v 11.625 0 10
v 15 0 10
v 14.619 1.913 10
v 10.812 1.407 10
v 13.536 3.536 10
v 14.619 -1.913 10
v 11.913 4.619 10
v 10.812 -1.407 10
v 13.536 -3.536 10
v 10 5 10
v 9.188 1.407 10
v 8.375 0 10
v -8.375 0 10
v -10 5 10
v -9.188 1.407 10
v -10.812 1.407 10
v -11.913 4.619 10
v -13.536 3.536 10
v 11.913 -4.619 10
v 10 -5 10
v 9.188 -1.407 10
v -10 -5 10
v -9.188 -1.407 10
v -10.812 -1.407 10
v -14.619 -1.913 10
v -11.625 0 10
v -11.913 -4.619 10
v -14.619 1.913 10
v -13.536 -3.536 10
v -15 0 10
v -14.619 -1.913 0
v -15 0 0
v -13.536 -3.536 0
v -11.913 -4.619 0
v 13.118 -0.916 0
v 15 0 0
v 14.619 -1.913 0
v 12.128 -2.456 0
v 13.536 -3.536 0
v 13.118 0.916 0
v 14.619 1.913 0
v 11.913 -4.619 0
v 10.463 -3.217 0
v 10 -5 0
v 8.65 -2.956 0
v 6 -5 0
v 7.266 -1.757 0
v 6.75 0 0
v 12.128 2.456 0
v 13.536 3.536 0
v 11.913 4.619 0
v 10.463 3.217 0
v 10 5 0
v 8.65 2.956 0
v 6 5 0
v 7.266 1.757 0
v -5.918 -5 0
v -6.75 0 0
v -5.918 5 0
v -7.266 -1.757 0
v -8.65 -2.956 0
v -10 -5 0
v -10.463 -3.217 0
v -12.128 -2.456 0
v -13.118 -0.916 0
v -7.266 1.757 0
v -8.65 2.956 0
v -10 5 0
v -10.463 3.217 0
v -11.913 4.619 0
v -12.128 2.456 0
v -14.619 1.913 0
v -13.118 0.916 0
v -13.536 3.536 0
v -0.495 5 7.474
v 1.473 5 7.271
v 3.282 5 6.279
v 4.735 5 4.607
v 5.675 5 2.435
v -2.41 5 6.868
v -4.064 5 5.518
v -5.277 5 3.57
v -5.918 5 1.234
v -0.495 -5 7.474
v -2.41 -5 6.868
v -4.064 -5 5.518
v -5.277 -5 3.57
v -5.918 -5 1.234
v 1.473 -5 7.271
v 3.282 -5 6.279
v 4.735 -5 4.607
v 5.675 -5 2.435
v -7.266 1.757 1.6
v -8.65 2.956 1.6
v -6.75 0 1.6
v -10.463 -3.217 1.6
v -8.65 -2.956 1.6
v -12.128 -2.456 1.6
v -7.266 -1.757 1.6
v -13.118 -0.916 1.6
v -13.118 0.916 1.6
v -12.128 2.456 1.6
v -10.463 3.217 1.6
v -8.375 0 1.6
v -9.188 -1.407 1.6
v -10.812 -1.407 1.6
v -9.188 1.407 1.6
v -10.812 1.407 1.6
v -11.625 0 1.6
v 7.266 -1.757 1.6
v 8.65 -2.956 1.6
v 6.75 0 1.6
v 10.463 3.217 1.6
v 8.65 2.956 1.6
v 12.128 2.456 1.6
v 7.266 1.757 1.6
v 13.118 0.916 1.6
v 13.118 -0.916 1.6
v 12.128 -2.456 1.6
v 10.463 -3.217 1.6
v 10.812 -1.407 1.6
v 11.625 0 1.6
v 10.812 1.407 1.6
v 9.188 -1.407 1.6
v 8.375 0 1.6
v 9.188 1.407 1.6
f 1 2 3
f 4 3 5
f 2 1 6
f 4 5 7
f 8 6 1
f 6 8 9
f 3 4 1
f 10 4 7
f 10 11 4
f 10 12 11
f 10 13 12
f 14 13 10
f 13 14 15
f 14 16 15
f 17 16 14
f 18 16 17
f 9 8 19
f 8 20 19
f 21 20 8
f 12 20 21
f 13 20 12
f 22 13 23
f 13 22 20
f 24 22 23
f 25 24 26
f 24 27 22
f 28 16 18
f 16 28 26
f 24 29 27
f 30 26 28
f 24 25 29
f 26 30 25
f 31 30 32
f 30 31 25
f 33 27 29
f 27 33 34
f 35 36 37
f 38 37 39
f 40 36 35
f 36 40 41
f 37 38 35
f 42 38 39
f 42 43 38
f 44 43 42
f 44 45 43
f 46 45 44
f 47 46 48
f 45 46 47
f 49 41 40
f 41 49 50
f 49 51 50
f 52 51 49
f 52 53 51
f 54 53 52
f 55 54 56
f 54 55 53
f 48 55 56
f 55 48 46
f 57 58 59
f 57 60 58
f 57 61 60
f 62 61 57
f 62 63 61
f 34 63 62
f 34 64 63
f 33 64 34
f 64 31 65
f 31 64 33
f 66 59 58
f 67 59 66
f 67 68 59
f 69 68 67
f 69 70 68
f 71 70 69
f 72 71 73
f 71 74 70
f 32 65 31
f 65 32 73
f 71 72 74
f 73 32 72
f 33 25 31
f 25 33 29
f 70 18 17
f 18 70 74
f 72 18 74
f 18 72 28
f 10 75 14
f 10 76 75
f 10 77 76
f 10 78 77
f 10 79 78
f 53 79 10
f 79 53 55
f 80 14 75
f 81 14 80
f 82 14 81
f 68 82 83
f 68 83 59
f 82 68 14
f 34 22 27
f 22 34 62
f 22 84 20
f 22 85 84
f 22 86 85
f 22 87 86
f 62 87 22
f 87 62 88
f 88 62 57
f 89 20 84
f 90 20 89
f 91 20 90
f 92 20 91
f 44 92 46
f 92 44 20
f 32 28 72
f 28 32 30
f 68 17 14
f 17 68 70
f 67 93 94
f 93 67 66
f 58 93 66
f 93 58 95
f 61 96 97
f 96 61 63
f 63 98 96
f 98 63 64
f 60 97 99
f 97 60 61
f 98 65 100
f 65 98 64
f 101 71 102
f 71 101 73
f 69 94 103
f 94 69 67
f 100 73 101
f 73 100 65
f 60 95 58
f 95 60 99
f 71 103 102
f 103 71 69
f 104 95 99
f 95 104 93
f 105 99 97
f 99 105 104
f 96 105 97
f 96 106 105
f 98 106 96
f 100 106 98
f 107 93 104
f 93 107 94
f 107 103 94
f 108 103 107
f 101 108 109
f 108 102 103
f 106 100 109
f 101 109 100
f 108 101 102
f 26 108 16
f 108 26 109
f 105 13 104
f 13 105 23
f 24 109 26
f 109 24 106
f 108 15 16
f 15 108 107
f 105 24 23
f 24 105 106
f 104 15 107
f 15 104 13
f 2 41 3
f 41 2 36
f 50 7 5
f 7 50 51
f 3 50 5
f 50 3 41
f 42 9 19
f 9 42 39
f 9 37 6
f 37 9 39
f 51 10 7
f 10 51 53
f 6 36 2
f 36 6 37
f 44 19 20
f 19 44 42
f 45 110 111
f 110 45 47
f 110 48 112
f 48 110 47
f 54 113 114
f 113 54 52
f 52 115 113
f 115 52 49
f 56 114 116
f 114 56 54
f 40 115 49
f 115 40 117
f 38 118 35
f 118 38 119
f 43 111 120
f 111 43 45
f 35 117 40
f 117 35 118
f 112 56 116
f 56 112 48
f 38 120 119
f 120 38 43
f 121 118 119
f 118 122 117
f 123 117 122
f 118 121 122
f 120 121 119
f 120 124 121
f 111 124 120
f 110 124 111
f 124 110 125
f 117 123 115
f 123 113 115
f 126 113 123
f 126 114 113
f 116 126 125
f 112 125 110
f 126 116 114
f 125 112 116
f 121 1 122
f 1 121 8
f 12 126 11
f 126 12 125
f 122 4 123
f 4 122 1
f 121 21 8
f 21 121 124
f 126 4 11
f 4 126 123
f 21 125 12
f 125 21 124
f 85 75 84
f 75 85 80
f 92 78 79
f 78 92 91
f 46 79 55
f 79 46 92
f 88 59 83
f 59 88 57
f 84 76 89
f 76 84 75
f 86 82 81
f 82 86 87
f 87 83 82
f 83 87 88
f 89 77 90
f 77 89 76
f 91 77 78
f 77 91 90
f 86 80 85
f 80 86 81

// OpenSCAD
// file: ../baseplate/nuts.scad
module rrect(w,l,r) {
    translate([r,r,0]) {
        minkowski() {
            square(size = [w-(2*r), l-(2*r)]);
            circle(r=r);
        }
    }
}

module nuthole_m2() {
    circle(d=2.1);
}

module nuthole_m25() {
    circle(d=2.6);
}

module nuthole_m3() {
    circle(d=3.15);
}
// main file
f = 10;
dist = 20;
height = 10;
screwhole=3.25;
tunnel_w = 12;
tunnel_h = 7.5;

use <../baseplate/nuts.scad>

module cable_holder_holes() {
    translate([-dist/2, 0, 0]) nuthole_m3();
    translate([dist/2, 0, 0]) nuthole_m3();
}

module cable_holder_column() {
    difference() {
        linear_extrude(height) union() {
            circle(d=f);
            translate([0, -f/2, 0]) square([f/2, f]);
        }
            
        translate([0, 0, -0.1]) linear_extrude(1.7) circle(d=6.5);
        translate([0, 0, -0.1]) linear_extrude(height + 0.2) circle(d=screwhole);
    }
}

module cable_holder() {
    difference() {
        union() {
            translate([-dist/2, 0, 0]) cable_holder_column();
            translate([dist/2, 0, 0]) rotate([0, 0, 180]) cable_holder_column();
            linear_extrude(height) square([dist - f + 0.01, f], center = true);
        }
       
        scale([1, 1, tunnel_h / (tunnel_w * 0.5)])
        translate([0, f, 0]) rotate([90, 0, 0]) linear_extrude(2 * f) circle(d=tunnel_w);
    }
}

cable_holder();
